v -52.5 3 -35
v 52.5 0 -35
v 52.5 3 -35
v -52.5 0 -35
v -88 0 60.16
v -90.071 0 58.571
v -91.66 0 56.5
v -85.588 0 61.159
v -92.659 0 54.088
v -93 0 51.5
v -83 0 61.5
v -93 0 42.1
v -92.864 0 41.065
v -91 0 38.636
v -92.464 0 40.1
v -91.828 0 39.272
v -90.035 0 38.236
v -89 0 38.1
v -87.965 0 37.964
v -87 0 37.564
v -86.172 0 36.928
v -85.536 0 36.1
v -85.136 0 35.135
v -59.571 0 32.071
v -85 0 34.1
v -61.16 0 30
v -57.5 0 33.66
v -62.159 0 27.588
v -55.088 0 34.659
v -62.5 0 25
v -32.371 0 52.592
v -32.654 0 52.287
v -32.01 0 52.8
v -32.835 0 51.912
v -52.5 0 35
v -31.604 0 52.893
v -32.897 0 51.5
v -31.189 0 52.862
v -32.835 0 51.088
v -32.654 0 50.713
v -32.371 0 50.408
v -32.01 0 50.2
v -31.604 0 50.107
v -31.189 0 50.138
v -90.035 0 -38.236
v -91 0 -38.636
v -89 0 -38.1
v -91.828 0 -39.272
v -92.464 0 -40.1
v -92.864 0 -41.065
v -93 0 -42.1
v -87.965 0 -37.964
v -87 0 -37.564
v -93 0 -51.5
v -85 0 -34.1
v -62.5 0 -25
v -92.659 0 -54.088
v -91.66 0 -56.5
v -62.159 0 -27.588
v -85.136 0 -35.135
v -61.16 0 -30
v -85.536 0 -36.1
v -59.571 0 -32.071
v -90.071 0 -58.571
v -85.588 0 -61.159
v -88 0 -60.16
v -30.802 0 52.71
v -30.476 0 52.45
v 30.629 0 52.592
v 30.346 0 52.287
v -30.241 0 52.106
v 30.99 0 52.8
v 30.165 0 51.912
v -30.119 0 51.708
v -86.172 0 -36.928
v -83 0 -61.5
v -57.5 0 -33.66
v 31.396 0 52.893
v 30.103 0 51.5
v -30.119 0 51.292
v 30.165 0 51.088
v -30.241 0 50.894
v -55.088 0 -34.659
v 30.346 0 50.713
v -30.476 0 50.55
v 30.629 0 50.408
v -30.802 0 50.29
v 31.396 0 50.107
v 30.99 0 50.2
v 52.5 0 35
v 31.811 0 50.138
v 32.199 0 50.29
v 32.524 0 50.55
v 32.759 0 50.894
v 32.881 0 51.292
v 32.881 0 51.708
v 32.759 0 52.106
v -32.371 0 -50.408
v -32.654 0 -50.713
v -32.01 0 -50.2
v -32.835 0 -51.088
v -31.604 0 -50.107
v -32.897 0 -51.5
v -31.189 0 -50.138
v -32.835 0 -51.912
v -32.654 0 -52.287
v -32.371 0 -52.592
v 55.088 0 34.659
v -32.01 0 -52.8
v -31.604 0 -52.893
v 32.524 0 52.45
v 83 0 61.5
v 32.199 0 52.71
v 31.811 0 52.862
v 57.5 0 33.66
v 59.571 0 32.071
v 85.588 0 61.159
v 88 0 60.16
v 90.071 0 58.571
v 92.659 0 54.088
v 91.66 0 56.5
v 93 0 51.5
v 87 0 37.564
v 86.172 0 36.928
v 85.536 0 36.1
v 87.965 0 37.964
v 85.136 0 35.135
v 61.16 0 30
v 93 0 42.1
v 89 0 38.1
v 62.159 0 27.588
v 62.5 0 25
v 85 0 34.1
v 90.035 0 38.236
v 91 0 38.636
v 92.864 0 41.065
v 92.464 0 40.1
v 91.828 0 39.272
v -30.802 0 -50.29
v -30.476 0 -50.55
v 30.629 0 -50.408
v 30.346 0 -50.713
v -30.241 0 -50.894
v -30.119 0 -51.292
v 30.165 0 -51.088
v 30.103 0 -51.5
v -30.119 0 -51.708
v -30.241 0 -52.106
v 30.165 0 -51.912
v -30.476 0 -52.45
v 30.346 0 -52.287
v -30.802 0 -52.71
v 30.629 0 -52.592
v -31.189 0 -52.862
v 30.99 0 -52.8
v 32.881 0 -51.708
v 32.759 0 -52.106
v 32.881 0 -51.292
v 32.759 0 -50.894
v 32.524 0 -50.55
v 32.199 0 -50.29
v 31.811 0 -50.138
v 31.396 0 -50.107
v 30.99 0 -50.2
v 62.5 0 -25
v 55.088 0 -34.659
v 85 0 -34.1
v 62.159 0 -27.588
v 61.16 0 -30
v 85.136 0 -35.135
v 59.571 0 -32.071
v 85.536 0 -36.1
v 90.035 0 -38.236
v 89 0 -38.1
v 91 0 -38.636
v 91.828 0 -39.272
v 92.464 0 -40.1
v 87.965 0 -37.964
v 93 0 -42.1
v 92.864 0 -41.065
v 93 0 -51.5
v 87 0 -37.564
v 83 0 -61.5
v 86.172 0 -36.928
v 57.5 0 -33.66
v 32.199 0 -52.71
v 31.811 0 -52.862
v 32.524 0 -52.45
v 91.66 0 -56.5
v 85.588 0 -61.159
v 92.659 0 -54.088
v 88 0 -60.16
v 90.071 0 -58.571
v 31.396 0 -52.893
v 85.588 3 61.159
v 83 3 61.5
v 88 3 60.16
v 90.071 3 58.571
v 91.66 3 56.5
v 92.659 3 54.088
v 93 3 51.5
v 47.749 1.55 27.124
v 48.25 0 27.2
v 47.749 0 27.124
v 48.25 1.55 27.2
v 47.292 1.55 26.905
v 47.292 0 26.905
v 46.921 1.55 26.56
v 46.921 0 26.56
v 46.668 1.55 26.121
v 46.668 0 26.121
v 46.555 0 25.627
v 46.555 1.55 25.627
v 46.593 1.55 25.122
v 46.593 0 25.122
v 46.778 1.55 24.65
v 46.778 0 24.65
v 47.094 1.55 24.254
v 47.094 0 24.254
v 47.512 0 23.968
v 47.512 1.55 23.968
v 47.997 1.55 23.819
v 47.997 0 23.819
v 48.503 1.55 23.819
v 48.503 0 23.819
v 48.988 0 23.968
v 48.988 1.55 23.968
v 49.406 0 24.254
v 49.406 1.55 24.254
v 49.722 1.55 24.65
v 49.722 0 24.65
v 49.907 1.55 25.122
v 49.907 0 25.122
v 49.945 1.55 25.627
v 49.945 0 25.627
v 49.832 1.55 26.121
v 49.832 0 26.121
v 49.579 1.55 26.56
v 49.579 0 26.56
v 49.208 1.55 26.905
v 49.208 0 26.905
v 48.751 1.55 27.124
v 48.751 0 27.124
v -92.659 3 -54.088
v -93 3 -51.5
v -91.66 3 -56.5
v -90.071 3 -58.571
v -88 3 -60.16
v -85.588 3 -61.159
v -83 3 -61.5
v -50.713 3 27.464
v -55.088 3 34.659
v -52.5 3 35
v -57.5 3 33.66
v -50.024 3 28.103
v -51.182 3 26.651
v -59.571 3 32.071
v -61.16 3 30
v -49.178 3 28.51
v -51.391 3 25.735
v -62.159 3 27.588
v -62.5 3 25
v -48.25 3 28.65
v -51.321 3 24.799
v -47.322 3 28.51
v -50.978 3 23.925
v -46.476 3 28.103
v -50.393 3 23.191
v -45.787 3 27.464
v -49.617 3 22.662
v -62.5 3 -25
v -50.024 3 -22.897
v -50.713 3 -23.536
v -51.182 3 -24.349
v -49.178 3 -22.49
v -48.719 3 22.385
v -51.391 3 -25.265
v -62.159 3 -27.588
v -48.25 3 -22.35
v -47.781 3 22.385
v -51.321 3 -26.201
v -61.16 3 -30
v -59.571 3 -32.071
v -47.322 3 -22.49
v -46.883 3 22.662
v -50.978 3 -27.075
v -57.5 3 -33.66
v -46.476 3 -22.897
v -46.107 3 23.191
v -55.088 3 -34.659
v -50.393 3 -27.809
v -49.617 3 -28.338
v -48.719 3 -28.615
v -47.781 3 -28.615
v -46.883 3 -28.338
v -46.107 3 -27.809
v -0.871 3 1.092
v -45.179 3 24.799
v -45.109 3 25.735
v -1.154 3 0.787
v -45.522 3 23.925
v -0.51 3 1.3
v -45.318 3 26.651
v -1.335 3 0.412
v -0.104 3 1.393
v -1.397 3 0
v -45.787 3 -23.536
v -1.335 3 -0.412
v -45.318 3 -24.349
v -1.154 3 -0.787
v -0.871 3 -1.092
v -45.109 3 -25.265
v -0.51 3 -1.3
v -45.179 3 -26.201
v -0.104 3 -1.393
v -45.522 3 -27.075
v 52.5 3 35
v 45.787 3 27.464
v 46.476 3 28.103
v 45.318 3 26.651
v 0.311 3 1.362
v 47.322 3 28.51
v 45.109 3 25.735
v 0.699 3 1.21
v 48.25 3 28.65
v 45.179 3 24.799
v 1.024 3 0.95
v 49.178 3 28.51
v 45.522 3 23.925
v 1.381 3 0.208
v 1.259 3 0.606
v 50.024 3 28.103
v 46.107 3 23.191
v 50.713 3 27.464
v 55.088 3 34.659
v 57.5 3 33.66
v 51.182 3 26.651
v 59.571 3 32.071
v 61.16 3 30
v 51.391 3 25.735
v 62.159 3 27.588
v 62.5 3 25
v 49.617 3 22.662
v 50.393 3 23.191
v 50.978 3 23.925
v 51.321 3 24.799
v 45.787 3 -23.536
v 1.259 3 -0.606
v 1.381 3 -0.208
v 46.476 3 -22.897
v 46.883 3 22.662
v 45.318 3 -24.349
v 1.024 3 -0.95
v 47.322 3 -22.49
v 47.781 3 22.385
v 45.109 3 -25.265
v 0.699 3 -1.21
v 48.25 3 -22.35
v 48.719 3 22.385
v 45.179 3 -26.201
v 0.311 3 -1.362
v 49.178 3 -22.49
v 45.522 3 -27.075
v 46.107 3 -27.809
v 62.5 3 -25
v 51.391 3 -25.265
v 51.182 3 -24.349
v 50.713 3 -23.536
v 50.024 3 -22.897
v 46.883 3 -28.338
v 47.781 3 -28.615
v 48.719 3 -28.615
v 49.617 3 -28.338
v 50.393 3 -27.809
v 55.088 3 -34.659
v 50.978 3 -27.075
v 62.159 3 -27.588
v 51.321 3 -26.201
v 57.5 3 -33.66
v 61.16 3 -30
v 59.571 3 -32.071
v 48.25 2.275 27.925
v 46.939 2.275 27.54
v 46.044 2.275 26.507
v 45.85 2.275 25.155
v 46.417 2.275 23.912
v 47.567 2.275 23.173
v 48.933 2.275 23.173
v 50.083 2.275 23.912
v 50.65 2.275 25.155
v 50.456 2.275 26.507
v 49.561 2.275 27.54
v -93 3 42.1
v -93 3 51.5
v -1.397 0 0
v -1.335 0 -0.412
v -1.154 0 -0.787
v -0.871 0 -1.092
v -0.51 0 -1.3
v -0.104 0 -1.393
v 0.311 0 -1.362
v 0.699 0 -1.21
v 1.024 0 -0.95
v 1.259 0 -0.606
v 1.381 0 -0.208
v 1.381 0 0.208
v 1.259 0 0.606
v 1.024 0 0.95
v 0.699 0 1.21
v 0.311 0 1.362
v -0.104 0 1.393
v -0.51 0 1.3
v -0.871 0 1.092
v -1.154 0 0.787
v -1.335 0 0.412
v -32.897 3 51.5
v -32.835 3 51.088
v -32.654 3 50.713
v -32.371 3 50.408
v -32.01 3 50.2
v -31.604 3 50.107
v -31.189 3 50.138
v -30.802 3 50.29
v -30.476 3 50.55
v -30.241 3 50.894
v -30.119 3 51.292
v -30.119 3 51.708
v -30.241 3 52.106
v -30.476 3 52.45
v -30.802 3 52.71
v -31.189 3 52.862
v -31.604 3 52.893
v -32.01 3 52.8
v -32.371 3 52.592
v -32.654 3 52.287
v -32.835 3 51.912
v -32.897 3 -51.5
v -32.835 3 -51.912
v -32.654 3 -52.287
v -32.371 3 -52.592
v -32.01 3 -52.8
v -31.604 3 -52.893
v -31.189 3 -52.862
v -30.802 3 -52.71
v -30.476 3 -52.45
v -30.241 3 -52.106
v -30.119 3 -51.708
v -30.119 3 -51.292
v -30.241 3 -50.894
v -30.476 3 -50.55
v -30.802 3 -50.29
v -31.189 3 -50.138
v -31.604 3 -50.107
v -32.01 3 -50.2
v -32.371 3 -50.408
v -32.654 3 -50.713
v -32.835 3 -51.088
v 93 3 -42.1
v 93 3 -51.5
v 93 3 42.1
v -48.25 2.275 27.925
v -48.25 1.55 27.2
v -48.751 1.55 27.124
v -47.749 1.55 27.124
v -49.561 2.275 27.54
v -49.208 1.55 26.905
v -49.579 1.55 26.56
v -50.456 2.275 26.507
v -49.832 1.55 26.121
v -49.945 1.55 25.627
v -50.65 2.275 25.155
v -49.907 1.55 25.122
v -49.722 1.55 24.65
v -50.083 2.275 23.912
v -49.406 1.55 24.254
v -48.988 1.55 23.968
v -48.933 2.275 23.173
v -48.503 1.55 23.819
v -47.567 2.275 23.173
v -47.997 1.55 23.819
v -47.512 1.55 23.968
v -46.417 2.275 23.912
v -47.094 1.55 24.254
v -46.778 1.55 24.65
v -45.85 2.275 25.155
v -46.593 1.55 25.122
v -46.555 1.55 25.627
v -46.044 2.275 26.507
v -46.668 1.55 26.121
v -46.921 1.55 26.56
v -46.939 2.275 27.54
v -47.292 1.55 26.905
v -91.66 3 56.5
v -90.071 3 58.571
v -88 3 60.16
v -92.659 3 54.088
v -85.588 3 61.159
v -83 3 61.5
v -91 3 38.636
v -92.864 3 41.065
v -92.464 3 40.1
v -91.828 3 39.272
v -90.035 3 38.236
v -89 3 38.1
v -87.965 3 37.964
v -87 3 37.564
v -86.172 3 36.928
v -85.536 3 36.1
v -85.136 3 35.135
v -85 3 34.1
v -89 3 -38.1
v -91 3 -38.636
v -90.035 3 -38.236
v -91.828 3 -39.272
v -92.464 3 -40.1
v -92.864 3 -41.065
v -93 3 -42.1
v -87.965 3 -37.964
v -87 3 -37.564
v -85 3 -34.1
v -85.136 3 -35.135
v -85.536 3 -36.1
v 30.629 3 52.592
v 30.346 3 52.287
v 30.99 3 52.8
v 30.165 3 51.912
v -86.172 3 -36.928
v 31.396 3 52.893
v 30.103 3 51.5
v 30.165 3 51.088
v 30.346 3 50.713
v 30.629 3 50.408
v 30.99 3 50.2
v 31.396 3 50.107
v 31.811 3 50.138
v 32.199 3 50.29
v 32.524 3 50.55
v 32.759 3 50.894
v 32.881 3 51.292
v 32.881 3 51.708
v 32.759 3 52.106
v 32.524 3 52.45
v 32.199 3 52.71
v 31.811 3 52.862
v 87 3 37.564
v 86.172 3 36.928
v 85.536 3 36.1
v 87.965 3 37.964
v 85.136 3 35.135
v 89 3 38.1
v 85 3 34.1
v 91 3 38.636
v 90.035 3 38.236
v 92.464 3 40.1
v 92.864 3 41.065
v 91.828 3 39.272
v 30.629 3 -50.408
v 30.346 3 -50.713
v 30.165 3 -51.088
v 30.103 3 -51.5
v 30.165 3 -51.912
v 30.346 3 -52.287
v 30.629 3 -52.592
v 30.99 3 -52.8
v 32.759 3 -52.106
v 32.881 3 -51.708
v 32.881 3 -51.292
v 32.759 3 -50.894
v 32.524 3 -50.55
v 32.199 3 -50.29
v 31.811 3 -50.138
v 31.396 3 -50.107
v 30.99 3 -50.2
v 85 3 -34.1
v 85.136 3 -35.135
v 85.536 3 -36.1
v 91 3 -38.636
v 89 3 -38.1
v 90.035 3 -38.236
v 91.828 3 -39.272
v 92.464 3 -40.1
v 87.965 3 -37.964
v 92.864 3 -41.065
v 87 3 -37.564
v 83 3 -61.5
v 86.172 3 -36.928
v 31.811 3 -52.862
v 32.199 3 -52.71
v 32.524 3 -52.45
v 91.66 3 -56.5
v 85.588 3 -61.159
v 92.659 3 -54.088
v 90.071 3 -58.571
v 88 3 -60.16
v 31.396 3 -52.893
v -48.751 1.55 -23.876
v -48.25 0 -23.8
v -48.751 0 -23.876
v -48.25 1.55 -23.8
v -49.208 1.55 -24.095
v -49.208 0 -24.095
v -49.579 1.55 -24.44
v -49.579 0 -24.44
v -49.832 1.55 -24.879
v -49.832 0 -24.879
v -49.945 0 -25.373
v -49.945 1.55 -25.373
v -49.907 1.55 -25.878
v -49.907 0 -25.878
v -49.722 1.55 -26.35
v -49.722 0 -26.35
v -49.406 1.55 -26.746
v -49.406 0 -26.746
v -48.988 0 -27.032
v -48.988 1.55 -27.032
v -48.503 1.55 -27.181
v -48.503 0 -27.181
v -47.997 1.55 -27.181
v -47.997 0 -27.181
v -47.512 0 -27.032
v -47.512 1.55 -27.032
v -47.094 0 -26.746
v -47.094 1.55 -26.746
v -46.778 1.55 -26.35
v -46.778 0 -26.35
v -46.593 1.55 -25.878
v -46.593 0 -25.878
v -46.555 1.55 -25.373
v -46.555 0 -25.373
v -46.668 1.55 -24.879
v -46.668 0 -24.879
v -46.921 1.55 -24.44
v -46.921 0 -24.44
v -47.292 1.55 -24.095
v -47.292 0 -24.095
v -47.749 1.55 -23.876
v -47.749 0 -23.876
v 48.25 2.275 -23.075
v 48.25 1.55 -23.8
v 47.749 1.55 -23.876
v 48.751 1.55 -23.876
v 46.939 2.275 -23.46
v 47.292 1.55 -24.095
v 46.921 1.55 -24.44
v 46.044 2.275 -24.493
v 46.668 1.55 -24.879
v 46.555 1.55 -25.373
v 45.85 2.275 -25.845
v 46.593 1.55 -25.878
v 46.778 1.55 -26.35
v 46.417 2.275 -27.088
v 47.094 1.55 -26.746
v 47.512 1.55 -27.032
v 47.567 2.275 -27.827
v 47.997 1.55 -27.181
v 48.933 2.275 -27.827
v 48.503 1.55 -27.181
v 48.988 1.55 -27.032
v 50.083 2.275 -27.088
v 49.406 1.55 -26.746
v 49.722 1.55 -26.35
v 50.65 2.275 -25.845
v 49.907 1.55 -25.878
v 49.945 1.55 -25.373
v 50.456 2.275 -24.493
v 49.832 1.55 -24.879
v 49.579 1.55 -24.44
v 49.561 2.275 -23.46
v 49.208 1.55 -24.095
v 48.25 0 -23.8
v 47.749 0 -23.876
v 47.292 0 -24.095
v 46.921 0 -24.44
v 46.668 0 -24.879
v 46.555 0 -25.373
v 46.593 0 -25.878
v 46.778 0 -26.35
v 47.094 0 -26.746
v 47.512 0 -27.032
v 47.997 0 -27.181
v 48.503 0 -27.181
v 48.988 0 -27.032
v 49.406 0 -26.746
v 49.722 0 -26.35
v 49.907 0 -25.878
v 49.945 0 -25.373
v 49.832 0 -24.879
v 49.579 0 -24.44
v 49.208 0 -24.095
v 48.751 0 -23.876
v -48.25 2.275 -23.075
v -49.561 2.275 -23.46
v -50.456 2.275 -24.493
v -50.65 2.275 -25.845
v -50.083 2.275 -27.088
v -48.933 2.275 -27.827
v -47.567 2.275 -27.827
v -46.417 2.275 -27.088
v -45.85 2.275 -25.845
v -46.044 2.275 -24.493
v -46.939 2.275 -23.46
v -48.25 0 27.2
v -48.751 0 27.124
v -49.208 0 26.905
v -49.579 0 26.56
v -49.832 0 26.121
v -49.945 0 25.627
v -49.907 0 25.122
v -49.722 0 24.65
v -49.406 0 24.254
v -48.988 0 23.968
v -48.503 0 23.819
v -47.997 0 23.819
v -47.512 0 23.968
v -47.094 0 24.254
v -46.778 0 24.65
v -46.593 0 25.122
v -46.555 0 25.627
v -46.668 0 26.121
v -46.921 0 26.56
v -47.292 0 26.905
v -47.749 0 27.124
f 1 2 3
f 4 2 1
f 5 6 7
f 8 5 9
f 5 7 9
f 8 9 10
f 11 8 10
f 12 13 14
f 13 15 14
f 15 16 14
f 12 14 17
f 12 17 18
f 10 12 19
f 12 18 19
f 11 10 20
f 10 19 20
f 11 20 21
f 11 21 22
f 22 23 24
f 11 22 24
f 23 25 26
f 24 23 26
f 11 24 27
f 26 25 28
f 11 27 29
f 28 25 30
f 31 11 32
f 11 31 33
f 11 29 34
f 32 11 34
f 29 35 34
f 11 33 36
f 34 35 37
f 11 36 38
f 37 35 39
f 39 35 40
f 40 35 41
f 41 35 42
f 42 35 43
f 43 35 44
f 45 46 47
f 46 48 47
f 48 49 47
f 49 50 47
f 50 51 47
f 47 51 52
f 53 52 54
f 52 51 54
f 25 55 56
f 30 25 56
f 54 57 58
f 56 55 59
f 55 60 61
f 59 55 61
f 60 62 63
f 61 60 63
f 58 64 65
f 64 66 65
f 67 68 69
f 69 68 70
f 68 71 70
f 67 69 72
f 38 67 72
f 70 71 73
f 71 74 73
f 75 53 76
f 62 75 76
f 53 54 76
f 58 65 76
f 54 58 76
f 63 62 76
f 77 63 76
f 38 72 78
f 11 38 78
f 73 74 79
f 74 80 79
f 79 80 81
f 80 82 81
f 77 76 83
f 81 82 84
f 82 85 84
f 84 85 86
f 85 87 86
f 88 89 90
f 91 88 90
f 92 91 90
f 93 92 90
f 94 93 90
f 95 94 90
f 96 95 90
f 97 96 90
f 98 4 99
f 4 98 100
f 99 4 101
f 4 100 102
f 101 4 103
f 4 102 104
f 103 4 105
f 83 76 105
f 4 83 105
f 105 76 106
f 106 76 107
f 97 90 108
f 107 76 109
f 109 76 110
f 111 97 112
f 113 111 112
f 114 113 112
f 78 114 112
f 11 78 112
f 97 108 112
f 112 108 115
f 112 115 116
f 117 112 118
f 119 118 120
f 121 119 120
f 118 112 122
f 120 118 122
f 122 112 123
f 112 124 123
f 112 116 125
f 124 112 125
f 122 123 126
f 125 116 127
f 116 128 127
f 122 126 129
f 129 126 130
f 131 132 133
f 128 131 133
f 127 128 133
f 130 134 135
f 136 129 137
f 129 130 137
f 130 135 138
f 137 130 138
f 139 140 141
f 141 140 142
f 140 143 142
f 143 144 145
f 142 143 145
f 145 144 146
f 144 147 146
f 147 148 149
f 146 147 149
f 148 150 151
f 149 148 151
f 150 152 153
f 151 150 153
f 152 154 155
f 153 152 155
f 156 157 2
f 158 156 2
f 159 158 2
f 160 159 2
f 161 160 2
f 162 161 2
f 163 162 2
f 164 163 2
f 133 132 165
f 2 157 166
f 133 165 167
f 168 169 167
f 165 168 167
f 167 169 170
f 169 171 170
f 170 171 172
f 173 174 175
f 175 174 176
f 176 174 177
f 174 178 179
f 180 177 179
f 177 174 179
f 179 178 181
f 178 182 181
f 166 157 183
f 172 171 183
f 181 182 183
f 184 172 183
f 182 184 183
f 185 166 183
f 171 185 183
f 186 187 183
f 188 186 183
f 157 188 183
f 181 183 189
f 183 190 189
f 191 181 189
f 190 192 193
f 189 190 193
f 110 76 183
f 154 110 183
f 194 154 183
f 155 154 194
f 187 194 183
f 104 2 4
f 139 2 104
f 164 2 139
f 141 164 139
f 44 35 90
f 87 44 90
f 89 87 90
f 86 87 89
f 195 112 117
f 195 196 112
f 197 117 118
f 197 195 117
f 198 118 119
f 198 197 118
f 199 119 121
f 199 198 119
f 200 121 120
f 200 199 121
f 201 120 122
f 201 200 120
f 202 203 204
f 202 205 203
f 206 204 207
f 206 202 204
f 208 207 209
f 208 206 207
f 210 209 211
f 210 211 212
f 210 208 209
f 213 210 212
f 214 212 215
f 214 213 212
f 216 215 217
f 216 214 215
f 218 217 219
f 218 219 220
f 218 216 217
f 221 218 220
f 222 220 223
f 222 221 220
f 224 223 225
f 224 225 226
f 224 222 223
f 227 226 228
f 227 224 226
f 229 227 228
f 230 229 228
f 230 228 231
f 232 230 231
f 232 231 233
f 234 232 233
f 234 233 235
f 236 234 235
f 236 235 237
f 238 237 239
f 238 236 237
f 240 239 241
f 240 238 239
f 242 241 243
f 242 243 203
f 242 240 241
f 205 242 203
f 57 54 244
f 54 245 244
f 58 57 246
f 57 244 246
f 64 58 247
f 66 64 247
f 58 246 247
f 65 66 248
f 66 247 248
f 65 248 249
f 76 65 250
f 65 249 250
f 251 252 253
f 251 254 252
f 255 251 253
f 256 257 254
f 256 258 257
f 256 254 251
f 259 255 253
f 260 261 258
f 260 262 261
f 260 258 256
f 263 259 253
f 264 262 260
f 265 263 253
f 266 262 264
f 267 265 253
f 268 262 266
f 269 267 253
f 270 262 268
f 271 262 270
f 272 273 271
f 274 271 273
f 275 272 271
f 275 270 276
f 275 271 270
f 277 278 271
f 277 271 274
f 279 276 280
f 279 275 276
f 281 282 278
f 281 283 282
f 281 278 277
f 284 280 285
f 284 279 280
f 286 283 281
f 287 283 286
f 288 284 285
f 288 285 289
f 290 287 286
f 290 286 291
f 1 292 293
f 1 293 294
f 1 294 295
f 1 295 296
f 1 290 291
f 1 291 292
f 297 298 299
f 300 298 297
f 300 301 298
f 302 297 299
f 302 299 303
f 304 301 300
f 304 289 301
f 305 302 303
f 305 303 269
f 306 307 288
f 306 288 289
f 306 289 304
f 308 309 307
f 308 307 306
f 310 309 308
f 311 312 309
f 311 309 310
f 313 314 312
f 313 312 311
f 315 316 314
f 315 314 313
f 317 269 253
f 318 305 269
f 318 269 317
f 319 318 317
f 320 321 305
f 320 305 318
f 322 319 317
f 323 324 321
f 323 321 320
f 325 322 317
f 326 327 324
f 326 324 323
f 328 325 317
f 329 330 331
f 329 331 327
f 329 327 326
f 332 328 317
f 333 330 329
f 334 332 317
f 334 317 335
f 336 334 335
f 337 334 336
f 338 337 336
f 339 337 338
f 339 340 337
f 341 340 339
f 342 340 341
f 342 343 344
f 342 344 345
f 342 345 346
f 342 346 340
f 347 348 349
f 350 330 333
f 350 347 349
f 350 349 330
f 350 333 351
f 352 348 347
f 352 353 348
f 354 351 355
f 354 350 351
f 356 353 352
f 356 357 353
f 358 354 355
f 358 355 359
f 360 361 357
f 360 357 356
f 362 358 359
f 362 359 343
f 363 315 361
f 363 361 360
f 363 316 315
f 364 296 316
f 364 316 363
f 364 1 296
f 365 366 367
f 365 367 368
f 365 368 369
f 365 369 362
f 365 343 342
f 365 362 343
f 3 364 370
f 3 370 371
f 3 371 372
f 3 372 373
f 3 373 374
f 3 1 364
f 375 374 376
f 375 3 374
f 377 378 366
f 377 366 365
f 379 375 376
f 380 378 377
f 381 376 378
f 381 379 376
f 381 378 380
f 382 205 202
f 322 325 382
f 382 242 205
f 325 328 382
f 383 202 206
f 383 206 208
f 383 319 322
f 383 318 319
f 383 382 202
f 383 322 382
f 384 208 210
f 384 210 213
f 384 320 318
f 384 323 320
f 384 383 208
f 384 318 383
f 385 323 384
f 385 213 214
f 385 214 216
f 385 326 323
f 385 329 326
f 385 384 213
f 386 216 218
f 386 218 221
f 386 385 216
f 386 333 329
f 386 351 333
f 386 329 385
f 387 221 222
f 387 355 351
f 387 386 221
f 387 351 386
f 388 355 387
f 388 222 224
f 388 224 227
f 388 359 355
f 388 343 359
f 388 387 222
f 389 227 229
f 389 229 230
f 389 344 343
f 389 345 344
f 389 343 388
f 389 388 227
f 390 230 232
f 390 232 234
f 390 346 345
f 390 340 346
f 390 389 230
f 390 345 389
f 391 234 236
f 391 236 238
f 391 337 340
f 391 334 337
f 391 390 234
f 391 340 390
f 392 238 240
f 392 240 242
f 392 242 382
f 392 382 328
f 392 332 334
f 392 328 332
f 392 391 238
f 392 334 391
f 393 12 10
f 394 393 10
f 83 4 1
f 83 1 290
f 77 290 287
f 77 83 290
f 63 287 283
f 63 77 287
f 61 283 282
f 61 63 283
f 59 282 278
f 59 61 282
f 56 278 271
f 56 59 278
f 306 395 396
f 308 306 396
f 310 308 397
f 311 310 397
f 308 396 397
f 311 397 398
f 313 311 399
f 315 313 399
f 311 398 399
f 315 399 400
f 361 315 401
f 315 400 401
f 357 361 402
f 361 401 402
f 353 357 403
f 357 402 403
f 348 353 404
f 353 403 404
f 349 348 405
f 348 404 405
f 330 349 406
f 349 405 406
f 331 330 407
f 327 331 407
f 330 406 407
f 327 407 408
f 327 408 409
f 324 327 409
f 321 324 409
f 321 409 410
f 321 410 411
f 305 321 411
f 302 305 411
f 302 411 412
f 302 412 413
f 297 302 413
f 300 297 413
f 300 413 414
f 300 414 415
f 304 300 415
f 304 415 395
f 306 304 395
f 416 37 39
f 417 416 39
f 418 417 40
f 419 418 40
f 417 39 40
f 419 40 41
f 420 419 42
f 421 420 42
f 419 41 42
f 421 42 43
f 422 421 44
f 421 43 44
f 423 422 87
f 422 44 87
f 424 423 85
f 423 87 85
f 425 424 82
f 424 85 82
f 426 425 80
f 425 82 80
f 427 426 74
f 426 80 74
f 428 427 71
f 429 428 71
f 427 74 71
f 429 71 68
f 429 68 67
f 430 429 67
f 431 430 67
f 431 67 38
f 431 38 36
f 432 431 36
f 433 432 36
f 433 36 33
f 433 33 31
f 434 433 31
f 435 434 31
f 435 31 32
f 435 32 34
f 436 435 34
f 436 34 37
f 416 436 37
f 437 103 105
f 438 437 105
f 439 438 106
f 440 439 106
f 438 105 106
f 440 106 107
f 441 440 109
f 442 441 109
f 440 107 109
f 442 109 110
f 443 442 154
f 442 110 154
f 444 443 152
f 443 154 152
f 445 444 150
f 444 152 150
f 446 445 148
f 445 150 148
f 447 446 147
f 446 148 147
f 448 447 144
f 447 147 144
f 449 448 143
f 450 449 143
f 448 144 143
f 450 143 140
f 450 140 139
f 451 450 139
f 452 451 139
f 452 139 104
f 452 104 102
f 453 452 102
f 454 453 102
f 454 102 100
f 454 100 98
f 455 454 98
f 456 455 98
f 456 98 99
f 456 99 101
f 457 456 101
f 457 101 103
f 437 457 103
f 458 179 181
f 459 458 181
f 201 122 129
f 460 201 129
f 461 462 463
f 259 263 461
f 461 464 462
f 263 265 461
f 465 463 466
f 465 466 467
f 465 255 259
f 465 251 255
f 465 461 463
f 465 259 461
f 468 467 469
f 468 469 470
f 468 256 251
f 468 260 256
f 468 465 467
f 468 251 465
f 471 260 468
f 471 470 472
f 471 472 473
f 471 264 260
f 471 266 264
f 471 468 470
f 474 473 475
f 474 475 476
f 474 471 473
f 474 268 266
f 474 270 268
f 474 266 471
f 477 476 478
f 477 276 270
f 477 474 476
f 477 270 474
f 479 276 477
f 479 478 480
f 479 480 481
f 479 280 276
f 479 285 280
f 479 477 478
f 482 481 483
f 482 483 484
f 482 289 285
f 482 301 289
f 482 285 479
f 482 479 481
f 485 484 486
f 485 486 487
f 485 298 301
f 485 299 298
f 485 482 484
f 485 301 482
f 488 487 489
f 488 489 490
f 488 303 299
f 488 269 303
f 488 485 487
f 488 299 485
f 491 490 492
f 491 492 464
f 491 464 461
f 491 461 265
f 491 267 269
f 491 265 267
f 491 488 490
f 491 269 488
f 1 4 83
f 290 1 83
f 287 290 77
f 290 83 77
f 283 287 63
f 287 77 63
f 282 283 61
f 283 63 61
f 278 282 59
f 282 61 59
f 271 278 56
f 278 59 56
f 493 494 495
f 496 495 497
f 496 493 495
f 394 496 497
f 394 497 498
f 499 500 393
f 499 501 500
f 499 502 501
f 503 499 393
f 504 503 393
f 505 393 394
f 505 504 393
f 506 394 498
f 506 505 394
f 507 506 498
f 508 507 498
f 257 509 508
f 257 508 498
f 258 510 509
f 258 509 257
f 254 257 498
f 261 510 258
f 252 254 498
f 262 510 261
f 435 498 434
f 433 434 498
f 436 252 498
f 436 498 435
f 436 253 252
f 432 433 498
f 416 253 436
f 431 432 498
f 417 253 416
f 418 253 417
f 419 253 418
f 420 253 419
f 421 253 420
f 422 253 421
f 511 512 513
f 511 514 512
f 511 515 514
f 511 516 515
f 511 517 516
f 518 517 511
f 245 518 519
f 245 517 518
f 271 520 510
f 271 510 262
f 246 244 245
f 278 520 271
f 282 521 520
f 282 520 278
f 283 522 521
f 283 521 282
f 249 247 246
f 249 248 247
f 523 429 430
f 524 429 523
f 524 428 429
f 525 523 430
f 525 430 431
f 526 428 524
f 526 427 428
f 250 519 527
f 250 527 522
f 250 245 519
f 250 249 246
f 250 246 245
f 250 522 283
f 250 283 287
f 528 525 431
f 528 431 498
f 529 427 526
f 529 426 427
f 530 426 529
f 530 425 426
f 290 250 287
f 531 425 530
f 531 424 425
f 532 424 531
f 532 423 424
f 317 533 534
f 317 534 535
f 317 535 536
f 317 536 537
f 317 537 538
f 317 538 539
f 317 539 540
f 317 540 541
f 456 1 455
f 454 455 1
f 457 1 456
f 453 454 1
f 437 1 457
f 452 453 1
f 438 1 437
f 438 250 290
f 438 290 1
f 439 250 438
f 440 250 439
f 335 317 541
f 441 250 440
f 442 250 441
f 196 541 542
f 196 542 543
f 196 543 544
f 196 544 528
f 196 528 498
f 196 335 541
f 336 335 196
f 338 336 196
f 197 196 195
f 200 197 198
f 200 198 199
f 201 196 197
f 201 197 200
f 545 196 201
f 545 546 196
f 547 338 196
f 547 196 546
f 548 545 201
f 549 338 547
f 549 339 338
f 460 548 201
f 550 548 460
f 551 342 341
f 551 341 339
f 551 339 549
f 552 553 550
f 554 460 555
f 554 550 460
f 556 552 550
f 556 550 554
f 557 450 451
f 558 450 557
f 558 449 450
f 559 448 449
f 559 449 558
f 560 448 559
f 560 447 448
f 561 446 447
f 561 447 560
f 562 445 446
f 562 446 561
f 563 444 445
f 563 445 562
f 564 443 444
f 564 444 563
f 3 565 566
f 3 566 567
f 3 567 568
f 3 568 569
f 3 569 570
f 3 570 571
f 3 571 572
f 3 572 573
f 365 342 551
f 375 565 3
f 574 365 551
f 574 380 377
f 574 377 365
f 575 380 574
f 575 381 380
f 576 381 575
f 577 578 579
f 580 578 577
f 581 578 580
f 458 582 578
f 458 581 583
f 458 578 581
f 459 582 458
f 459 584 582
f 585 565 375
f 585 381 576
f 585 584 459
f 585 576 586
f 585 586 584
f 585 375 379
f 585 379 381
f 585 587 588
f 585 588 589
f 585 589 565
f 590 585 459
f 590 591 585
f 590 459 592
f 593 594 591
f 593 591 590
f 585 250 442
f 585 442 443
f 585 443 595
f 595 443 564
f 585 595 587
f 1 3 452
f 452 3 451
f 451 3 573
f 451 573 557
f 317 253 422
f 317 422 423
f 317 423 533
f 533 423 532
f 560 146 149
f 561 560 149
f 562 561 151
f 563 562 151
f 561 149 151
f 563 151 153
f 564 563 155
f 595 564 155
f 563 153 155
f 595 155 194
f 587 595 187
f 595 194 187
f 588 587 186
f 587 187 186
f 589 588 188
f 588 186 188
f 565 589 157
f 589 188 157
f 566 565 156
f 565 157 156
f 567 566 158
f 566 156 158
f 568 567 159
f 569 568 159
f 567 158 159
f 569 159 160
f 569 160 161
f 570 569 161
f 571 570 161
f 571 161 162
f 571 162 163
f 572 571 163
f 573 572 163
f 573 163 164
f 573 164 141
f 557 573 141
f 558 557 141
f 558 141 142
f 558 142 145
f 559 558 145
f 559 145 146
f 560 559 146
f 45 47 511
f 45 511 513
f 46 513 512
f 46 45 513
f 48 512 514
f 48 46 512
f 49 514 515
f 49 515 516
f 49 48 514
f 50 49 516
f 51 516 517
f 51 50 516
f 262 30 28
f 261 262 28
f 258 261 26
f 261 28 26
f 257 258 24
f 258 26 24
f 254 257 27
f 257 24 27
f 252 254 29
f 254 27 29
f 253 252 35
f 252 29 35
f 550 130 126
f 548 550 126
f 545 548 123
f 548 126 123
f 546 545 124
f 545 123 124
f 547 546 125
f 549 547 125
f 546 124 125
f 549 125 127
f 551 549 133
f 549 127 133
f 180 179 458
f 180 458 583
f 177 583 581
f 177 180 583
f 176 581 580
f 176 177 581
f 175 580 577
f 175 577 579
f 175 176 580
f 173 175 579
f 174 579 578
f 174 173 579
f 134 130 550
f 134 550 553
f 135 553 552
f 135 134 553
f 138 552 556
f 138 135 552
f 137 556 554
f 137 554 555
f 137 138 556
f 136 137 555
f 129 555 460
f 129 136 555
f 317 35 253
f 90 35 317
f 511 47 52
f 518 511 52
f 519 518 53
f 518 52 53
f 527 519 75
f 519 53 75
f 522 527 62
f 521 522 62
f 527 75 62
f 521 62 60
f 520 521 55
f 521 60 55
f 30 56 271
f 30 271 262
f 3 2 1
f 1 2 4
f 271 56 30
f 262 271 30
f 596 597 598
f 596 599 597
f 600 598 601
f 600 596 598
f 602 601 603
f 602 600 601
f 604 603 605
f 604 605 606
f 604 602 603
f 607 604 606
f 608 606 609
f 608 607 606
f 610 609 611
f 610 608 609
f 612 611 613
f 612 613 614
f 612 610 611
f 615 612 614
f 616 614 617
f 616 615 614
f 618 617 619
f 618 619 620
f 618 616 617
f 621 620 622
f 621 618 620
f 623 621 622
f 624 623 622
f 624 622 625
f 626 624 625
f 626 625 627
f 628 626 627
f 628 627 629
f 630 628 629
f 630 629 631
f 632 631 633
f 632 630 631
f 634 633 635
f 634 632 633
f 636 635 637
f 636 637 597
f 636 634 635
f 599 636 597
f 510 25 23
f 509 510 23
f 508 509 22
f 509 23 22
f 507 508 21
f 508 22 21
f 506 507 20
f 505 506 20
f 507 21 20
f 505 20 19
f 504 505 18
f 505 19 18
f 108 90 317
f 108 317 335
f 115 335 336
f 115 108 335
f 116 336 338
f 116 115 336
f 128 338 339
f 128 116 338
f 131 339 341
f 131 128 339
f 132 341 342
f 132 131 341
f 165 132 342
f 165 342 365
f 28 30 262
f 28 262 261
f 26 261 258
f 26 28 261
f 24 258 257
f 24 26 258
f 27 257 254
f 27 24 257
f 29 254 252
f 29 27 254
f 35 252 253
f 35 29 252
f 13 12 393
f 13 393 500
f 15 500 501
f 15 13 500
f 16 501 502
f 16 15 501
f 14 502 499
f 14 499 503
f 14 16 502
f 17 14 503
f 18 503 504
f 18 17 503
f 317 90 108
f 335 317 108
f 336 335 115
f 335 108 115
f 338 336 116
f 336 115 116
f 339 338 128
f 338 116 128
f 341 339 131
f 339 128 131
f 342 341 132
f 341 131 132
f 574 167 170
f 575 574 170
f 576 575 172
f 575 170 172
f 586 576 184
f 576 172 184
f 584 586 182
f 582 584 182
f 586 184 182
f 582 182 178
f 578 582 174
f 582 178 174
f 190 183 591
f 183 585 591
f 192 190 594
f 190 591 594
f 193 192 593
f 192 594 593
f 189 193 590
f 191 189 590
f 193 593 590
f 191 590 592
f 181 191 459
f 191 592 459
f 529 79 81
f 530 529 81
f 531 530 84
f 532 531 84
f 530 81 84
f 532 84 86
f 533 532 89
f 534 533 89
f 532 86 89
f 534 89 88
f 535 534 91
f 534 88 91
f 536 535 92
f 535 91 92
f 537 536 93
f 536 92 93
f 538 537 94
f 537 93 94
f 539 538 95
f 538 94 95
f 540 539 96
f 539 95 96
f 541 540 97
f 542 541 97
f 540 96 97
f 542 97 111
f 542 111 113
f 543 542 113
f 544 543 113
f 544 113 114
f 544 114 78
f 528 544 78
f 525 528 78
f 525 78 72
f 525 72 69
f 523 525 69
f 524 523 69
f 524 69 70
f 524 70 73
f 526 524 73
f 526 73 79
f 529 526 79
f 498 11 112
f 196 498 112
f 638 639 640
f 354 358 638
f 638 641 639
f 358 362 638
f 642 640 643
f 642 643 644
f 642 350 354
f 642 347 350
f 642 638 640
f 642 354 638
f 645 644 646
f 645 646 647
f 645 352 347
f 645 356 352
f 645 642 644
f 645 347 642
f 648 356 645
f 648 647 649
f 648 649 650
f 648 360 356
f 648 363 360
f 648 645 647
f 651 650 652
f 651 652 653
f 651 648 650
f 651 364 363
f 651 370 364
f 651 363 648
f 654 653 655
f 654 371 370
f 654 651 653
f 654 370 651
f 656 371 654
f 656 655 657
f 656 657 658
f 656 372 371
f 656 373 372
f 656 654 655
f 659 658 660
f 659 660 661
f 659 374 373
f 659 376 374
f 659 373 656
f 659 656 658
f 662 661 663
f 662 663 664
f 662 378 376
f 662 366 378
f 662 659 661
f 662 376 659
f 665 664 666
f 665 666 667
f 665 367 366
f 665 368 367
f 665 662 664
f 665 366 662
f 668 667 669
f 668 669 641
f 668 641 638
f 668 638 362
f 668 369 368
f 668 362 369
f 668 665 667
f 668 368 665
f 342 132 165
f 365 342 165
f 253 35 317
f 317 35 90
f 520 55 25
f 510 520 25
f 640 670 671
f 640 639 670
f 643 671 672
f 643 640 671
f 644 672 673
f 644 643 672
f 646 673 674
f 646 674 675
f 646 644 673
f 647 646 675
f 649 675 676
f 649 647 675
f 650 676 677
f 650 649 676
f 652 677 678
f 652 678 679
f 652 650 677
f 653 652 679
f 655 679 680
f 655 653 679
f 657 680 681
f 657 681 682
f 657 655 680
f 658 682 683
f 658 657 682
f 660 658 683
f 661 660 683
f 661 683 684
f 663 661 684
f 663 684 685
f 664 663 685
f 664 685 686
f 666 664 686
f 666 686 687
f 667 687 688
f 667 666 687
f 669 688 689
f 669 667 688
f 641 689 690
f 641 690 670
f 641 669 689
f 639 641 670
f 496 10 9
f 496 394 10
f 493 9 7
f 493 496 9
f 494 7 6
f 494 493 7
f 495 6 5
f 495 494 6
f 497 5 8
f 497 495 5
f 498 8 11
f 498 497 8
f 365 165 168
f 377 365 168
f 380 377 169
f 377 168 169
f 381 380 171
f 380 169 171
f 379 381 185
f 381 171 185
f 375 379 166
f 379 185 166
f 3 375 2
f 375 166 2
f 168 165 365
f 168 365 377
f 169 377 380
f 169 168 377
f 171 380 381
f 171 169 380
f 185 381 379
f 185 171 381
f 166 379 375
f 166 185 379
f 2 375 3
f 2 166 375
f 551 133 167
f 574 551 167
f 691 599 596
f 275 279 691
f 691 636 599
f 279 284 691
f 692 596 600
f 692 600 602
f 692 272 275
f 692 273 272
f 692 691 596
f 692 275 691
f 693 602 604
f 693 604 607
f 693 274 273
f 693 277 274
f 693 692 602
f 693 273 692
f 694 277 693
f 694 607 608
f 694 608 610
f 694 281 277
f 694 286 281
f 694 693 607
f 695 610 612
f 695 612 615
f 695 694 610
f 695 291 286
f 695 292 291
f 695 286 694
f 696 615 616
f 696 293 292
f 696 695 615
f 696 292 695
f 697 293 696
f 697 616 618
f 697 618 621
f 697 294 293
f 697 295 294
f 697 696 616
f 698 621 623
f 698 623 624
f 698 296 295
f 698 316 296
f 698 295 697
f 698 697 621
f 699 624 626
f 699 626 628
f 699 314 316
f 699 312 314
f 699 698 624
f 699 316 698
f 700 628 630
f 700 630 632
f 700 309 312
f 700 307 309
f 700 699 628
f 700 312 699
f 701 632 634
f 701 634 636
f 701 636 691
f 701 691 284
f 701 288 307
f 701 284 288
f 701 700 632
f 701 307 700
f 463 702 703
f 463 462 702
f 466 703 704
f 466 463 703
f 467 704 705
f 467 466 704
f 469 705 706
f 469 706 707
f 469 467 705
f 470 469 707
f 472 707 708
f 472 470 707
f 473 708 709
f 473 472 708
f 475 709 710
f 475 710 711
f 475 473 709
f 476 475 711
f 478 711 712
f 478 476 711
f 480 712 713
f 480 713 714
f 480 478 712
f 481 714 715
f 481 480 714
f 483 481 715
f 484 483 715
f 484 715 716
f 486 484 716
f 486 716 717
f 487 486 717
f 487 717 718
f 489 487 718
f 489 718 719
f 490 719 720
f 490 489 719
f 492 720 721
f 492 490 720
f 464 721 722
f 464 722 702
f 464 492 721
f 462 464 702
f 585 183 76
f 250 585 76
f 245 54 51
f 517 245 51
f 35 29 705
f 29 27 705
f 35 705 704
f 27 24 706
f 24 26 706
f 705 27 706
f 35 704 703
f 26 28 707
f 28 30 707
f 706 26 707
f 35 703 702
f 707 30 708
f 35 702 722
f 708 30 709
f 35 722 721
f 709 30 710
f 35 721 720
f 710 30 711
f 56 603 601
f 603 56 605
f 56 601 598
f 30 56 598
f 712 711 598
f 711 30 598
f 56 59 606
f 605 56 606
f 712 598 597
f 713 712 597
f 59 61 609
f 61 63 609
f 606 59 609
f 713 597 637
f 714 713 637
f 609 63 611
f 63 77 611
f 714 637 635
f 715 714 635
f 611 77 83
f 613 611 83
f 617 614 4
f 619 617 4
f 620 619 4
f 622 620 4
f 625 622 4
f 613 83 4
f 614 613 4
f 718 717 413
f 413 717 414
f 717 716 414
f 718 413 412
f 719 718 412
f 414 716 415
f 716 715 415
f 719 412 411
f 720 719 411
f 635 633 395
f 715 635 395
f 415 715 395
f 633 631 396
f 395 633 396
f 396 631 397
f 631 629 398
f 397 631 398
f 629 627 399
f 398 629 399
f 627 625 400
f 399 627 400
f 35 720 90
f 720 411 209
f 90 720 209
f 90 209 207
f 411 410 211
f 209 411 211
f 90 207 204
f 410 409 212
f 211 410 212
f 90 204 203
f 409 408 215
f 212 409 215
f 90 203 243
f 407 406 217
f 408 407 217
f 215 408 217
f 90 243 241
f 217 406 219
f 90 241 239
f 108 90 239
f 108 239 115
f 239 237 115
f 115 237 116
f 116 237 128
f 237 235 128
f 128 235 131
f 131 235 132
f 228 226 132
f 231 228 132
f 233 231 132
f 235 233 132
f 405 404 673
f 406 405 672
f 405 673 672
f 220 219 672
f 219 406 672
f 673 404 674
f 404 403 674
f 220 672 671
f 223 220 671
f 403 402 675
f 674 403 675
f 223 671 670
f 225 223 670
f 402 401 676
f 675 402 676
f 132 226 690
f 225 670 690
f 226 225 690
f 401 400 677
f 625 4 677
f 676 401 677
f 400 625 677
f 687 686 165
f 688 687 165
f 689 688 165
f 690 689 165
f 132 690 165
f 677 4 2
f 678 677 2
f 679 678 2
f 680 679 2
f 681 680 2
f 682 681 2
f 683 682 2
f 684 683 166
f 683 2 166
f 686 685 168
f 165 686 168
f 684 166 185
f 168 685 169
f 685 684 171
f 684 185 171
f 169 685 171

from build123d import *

# Parameters (mm, degrees)
BOSS_EXTRUDE1_DEPTH                            = 3
CSK_FOR_M3_FLAT_HEAD_MACHINE_SCREW1_AT_2_COUNT = 2
CSK_FOR_M3_FLAT_HEAD_MACHINE_SCREW1_AT_2_PITCH = 96.5
CSK_FOR_M3_FLAT_HEAD_MACHINE_SCREW1_AT_3_COUNT = 2
CSK_FOR_M3_FLAT_HEAD_MACHINE_SCREW1_AT_3_PITCH = 109.147835526
CSK_FOR_M3_FLAT_HEAD_MACHINE_SCREW1_AT_4_COUNT = 2
CSK_FOR_M3_FLAT_HEAD_MACHINE_SCREW1_AT_4_PITCH = 51
F_3_CLEARANCE_HOLE2_D                          = 2.794
FILLET1_R                                      = 10
FILLET2_START                                  = -1
FILLET2_DEPTH                                  = 5
FILLET2_2_DEPTH                                = 3
SPLIT2_SURFACE_1_BACK                          = 224.011
SPLIT2_SURFACE_1_DEPTH                         = 448.022
SPLIT2_SURFACE_2_BACK                          = 224.011
SPLIT2_SURFACE_2_DEPTH                         = 448.022


with BuildPart() as part:
    # Boss-Extrude1: read off the stored shape, not the designer's step
    # Boss-Extrude1 outline → Boss-Extrude1 (new body)
    with BuildSketch(Plane(origin=(0, 0, 0), x_dir=(1, 0, 0), z_dir=(0, 1, 0))):
        Polygon((-93, -38.1), (-93, -61.5), (93, -61.5), (93, -38.1), (85, -38.1), (85, 38.1), (93, 38.1), (93, 61.5), (-93, 61.5), (-93, 38.1), (-85, 38.1), (-85, -38.1), align=None)
    extrude(amount=BOSS_EXTRUDE1_DEPTH)

    # Sketch3 → CSK for M3 Flat Head Machine Screw1 (revolve, cut)
    with BuildSketch(Plane(origin=(-48.25, 3, -25.5), x_dir=(0, 0, 1), z_dir=(1, 0, 0))):
        Polygon((0, 0), (0, 3), (1.7, 3), (1.7, 1.45), (3.15, 0), align=None)
    csk_for_m3_flat_head_machine_screw1 = revolve(axis=Axis((-48.25, 9.35, -25.5), (0, -1, 0)), mode=Mode.SUBTRACT)

    # CSK for M3 Flat Head Machine Screw1 at 2: CSK for M3 Flat Head Machine Screw1 ×2
    with Locations(*[(i * CSK_FOR_M3_FLAT_HEAD_MACHINE_SCREW1_AT_2_PITCH, 0, 0) for i in range(1, CSK_FOR_M3_FLAT_HEAD_MACHINE_SCREW1_AT_2_COUNT)]):
        add(csk_for_m3_flat_head_machine_screw1, mode=Mode.SUBTRACT)

    # CSK for M3 Flat Head Machine Screw1 at 3: CSK for M3 Flat Head Machine Screw1 ×2
    with Locations(*[Vector(0.8841219758046083, 0, 0.4672561737412956) * (i * CSK_FOR_M3_FLAT_HEAD_MACHINE_SCREW1_AT_3_PITCH) for i in range(1, CSK_FOR_M3_FLAT_HEAD_MACHINE_SCREW1_AT_3_COUNT)]):
        add(csk_for_m3_flat_head_machine_screw1, mode=Mode.SUBTRACT)

    # CSK for M3 Flat Head Machine Screw1 at 4: CSK for M3 Flat Head Machine Screw1 ×2
    with Locations(*[(0, 0, i * CSK_FOR_M3_FLAT_HEAD_MACHINE_SCREW1_AT_4_PITCH) for i in range(1, CSK_FOR_M3_FLAT_HEAD_MACHINE_SCREW1_AT_4_COUNT)]):
        add(csk_for_m3_flat_head_machine_screw1, mode=Mode.SUBTRACT)

    # #3 Clearance Hole2 (through all)
    with Locations(Plane(origin=(0, 3, 0), x_dir=(1, 0, 0), z_dir=(0, 1, 0))):
        with Locations((-31.5, 51.5), (31.5, 51.5), (31.5, -51.5), (-31.5, -51.5), (0, 0)):
            Hole(F_3_CLEARANCE_HOLE2_D / 2)

    # Fillet1
    fillet1_edges = [part.edges().sort_by_distance(p)[0] for p in [
        (-93, 1.5, -61.5),
        (93, 1.5, -61.5),
        (93, 1.5, 61.5),
        (-93, 1.5, 61.5),
    ]]
    fillet(fillet1_edges, radius=FILLET1_R)

    # Fillet2: read off the stored shape, not the designer's step
    # Fillet2 outline → Fillet2 (cut)
    with BuildSketch(Plane(origin=(0, 0, 0), x_dir=(1, 0, 0), z_dir=(0, 1, 0)).offset(FILLET2_START)):
        with BuildLine():
            Line((-93, 38.1), (-89, 38.1))
            ThreePointArc((-89, 38.1), (-91.828427125, 39.271572875), (-93, 42.1))
            Line((-93, 42.1), (-93, 38.1))
        make_face()
        with BuildLine():
            ThreePointArc((-93, -42.1), (-91.828427125, -39.271572875), (-89, -38.1))
            Line((-89, -38.1), (-93, -38.1))
            Line((-93, -38.1), (-93, -42.1))
        make_face()
        with BuildLine():
            Line((93, -38.1), (89, -38.1))
            ThreePointArc((89, -38.1), (91.828427125, -39.271572875), (93, -42.1))
            Line((93, -42.1), (93, -38.1))
        make_face()
        with BuildLine():
            ThreePointArc((93, 42.1), (91.828427125, 39.271572875), (89, 38.1))
            Line((89, 38.1), (93, 38.1))
            Line((93, 38.1), (93, 42.1))
        make_face()
    extrude(amount=FILLET2_DEPTH, mode=Mode.SUBTRACT)

    # Fillet2 2 outline → Fillet2 2 (add)
    with BuildSketch(Plane(origin=(0, 0, 0), x_dir=(1, 0, 0), z_dir=(0, 1, 0))):
        with BuildLine():
            ThreePointArc((-89, 38.1), (-86.171572875, 36.928427125), (-85, 34.1))
            Line((-85, 34.1), (-85, 38.1))
            Line((-85, 38.1), (-89, 38.1))
        make_face()
        with BuildLine():
            ThreePointArc((-85, -34.1), (-86.171572875, -36.928427125), (-89, -38.1))
            Line((-89, -38.1), (-85, -38.1))
            Line((-85, -38.1), (-85, -34.1))
        make_face()
        with BuildLine():
            ThreePointArc((89, -38.1), (86.171572875, -36.928427125), (85, -34.1))
            Line((85, -34.1), (85, -38.1))
            Line((85, -38.1), (89, -38.1))
        make_face()
        with BuildLine():
            ThreePointArc((85, 34.1), (86.171572875, 36.928427125), (89, 38.1))
            Line((89, 38.1), (85, 38.1))
            Line((85, 38.1), (85, 34.1))
        make_face()
    extrude(amount=FILLET2_2_DEPTH)


with BuildPart() as body_2:
    # Split2: the piece behind the surface
    add(part.part)
    # Split2 surface: a surface, the sketch's curves swept straight by 448.022 mm
    with BuildLine(Plane(origin=(0, 3, 0), x_dir=(1, 0, 0), z_dir=(0, 1, 0)).offset(-SPLIT2_SURFACE_1_BACK), mode=Mode.PRIVATE) as split2_surface_1_path:
        Line((52.5, 35), (-52.5, 35))
        ThreePointArc((-52.5, 35), (-59.571067812, 32.071067812), (-62.5, 25))
        Line((-62.5, 25), (-62.5, -25))
        ThreePointArc((-62.5, -25), (-59.571067812, -32.071067812), (-52.5, -35))
        Line((-52.5, -35), (52.5, -35))
        ThreePointArc((52.5, -35), (59.571067812, -32.071067812), (62.5, -25))
        Line((62.5, -25), (62.5, 25))
        ThreePointArc((62.5, 25), (59.571067812, 32.071067812), (52.5, 35))
    split2_surface_1 = Shell.extrude(split2_surface_1_path.wire(), (0 * SPLIT2_SURFACE_1_DEPTH, 1 * SPLIT2_SURFACE_1_DEPTH, 0 * SPLIT2_SURFACE_1_DEPTH))
    split(bisect_by=split2_surface_1, keep=Keep.BOTTOM)


with BuildPart() as part_1:
    add(part.part)

    # Split2: split by a surface, the side it looks to stays
    # Split2 surface: a surface, the sketch's curves swept straight by 448.022 mm
    with BuildLine(Plane(origin=(0, 3, 0), x_dir=(1, 0, 0), z_dir=(0, 1, 0)).offset(-SPLIT2_SURFACE_2_BACK), mode=Mode.PRIVATE) as split2_surface_2_path:
        Line((52.5, 35), (-52.5, 35))
        ThreePointArc((-52.5, 35), (-59.571067812, 32.071067812), (-62.5, 25))
        Line((-62.5, 25), (-62.5, -25))
        ThreePointArc((-62.5, -25), (-59.571067812, -32.071067812), (-52.5, -35))
        Line((-52.5, -35), (52.5, -35))
        ThreePointArc((52.5, -35), (59.571067812, -32.071067812), (62.5, -25))
        Line((62.5, -25), (62.5, 25))
        ThreePointArc((62.5, 25), (59.571067812, 32.071067812), (52.5, 35))
    split2_surface_2 = Shell.extrude(split2_surface_2_path.wire(), (0 * SPLIT2_SURFACE_2_DEPTH, 1 * SPLIT2_SURFACE_2_DEPTH, 0 * SPLIT2_SURFACE_2_DEPTH))
    split(bisect_by=split2_surface_2, keep=Keep.TOP)


solid = Compound([body_2.part, part_1.part])
